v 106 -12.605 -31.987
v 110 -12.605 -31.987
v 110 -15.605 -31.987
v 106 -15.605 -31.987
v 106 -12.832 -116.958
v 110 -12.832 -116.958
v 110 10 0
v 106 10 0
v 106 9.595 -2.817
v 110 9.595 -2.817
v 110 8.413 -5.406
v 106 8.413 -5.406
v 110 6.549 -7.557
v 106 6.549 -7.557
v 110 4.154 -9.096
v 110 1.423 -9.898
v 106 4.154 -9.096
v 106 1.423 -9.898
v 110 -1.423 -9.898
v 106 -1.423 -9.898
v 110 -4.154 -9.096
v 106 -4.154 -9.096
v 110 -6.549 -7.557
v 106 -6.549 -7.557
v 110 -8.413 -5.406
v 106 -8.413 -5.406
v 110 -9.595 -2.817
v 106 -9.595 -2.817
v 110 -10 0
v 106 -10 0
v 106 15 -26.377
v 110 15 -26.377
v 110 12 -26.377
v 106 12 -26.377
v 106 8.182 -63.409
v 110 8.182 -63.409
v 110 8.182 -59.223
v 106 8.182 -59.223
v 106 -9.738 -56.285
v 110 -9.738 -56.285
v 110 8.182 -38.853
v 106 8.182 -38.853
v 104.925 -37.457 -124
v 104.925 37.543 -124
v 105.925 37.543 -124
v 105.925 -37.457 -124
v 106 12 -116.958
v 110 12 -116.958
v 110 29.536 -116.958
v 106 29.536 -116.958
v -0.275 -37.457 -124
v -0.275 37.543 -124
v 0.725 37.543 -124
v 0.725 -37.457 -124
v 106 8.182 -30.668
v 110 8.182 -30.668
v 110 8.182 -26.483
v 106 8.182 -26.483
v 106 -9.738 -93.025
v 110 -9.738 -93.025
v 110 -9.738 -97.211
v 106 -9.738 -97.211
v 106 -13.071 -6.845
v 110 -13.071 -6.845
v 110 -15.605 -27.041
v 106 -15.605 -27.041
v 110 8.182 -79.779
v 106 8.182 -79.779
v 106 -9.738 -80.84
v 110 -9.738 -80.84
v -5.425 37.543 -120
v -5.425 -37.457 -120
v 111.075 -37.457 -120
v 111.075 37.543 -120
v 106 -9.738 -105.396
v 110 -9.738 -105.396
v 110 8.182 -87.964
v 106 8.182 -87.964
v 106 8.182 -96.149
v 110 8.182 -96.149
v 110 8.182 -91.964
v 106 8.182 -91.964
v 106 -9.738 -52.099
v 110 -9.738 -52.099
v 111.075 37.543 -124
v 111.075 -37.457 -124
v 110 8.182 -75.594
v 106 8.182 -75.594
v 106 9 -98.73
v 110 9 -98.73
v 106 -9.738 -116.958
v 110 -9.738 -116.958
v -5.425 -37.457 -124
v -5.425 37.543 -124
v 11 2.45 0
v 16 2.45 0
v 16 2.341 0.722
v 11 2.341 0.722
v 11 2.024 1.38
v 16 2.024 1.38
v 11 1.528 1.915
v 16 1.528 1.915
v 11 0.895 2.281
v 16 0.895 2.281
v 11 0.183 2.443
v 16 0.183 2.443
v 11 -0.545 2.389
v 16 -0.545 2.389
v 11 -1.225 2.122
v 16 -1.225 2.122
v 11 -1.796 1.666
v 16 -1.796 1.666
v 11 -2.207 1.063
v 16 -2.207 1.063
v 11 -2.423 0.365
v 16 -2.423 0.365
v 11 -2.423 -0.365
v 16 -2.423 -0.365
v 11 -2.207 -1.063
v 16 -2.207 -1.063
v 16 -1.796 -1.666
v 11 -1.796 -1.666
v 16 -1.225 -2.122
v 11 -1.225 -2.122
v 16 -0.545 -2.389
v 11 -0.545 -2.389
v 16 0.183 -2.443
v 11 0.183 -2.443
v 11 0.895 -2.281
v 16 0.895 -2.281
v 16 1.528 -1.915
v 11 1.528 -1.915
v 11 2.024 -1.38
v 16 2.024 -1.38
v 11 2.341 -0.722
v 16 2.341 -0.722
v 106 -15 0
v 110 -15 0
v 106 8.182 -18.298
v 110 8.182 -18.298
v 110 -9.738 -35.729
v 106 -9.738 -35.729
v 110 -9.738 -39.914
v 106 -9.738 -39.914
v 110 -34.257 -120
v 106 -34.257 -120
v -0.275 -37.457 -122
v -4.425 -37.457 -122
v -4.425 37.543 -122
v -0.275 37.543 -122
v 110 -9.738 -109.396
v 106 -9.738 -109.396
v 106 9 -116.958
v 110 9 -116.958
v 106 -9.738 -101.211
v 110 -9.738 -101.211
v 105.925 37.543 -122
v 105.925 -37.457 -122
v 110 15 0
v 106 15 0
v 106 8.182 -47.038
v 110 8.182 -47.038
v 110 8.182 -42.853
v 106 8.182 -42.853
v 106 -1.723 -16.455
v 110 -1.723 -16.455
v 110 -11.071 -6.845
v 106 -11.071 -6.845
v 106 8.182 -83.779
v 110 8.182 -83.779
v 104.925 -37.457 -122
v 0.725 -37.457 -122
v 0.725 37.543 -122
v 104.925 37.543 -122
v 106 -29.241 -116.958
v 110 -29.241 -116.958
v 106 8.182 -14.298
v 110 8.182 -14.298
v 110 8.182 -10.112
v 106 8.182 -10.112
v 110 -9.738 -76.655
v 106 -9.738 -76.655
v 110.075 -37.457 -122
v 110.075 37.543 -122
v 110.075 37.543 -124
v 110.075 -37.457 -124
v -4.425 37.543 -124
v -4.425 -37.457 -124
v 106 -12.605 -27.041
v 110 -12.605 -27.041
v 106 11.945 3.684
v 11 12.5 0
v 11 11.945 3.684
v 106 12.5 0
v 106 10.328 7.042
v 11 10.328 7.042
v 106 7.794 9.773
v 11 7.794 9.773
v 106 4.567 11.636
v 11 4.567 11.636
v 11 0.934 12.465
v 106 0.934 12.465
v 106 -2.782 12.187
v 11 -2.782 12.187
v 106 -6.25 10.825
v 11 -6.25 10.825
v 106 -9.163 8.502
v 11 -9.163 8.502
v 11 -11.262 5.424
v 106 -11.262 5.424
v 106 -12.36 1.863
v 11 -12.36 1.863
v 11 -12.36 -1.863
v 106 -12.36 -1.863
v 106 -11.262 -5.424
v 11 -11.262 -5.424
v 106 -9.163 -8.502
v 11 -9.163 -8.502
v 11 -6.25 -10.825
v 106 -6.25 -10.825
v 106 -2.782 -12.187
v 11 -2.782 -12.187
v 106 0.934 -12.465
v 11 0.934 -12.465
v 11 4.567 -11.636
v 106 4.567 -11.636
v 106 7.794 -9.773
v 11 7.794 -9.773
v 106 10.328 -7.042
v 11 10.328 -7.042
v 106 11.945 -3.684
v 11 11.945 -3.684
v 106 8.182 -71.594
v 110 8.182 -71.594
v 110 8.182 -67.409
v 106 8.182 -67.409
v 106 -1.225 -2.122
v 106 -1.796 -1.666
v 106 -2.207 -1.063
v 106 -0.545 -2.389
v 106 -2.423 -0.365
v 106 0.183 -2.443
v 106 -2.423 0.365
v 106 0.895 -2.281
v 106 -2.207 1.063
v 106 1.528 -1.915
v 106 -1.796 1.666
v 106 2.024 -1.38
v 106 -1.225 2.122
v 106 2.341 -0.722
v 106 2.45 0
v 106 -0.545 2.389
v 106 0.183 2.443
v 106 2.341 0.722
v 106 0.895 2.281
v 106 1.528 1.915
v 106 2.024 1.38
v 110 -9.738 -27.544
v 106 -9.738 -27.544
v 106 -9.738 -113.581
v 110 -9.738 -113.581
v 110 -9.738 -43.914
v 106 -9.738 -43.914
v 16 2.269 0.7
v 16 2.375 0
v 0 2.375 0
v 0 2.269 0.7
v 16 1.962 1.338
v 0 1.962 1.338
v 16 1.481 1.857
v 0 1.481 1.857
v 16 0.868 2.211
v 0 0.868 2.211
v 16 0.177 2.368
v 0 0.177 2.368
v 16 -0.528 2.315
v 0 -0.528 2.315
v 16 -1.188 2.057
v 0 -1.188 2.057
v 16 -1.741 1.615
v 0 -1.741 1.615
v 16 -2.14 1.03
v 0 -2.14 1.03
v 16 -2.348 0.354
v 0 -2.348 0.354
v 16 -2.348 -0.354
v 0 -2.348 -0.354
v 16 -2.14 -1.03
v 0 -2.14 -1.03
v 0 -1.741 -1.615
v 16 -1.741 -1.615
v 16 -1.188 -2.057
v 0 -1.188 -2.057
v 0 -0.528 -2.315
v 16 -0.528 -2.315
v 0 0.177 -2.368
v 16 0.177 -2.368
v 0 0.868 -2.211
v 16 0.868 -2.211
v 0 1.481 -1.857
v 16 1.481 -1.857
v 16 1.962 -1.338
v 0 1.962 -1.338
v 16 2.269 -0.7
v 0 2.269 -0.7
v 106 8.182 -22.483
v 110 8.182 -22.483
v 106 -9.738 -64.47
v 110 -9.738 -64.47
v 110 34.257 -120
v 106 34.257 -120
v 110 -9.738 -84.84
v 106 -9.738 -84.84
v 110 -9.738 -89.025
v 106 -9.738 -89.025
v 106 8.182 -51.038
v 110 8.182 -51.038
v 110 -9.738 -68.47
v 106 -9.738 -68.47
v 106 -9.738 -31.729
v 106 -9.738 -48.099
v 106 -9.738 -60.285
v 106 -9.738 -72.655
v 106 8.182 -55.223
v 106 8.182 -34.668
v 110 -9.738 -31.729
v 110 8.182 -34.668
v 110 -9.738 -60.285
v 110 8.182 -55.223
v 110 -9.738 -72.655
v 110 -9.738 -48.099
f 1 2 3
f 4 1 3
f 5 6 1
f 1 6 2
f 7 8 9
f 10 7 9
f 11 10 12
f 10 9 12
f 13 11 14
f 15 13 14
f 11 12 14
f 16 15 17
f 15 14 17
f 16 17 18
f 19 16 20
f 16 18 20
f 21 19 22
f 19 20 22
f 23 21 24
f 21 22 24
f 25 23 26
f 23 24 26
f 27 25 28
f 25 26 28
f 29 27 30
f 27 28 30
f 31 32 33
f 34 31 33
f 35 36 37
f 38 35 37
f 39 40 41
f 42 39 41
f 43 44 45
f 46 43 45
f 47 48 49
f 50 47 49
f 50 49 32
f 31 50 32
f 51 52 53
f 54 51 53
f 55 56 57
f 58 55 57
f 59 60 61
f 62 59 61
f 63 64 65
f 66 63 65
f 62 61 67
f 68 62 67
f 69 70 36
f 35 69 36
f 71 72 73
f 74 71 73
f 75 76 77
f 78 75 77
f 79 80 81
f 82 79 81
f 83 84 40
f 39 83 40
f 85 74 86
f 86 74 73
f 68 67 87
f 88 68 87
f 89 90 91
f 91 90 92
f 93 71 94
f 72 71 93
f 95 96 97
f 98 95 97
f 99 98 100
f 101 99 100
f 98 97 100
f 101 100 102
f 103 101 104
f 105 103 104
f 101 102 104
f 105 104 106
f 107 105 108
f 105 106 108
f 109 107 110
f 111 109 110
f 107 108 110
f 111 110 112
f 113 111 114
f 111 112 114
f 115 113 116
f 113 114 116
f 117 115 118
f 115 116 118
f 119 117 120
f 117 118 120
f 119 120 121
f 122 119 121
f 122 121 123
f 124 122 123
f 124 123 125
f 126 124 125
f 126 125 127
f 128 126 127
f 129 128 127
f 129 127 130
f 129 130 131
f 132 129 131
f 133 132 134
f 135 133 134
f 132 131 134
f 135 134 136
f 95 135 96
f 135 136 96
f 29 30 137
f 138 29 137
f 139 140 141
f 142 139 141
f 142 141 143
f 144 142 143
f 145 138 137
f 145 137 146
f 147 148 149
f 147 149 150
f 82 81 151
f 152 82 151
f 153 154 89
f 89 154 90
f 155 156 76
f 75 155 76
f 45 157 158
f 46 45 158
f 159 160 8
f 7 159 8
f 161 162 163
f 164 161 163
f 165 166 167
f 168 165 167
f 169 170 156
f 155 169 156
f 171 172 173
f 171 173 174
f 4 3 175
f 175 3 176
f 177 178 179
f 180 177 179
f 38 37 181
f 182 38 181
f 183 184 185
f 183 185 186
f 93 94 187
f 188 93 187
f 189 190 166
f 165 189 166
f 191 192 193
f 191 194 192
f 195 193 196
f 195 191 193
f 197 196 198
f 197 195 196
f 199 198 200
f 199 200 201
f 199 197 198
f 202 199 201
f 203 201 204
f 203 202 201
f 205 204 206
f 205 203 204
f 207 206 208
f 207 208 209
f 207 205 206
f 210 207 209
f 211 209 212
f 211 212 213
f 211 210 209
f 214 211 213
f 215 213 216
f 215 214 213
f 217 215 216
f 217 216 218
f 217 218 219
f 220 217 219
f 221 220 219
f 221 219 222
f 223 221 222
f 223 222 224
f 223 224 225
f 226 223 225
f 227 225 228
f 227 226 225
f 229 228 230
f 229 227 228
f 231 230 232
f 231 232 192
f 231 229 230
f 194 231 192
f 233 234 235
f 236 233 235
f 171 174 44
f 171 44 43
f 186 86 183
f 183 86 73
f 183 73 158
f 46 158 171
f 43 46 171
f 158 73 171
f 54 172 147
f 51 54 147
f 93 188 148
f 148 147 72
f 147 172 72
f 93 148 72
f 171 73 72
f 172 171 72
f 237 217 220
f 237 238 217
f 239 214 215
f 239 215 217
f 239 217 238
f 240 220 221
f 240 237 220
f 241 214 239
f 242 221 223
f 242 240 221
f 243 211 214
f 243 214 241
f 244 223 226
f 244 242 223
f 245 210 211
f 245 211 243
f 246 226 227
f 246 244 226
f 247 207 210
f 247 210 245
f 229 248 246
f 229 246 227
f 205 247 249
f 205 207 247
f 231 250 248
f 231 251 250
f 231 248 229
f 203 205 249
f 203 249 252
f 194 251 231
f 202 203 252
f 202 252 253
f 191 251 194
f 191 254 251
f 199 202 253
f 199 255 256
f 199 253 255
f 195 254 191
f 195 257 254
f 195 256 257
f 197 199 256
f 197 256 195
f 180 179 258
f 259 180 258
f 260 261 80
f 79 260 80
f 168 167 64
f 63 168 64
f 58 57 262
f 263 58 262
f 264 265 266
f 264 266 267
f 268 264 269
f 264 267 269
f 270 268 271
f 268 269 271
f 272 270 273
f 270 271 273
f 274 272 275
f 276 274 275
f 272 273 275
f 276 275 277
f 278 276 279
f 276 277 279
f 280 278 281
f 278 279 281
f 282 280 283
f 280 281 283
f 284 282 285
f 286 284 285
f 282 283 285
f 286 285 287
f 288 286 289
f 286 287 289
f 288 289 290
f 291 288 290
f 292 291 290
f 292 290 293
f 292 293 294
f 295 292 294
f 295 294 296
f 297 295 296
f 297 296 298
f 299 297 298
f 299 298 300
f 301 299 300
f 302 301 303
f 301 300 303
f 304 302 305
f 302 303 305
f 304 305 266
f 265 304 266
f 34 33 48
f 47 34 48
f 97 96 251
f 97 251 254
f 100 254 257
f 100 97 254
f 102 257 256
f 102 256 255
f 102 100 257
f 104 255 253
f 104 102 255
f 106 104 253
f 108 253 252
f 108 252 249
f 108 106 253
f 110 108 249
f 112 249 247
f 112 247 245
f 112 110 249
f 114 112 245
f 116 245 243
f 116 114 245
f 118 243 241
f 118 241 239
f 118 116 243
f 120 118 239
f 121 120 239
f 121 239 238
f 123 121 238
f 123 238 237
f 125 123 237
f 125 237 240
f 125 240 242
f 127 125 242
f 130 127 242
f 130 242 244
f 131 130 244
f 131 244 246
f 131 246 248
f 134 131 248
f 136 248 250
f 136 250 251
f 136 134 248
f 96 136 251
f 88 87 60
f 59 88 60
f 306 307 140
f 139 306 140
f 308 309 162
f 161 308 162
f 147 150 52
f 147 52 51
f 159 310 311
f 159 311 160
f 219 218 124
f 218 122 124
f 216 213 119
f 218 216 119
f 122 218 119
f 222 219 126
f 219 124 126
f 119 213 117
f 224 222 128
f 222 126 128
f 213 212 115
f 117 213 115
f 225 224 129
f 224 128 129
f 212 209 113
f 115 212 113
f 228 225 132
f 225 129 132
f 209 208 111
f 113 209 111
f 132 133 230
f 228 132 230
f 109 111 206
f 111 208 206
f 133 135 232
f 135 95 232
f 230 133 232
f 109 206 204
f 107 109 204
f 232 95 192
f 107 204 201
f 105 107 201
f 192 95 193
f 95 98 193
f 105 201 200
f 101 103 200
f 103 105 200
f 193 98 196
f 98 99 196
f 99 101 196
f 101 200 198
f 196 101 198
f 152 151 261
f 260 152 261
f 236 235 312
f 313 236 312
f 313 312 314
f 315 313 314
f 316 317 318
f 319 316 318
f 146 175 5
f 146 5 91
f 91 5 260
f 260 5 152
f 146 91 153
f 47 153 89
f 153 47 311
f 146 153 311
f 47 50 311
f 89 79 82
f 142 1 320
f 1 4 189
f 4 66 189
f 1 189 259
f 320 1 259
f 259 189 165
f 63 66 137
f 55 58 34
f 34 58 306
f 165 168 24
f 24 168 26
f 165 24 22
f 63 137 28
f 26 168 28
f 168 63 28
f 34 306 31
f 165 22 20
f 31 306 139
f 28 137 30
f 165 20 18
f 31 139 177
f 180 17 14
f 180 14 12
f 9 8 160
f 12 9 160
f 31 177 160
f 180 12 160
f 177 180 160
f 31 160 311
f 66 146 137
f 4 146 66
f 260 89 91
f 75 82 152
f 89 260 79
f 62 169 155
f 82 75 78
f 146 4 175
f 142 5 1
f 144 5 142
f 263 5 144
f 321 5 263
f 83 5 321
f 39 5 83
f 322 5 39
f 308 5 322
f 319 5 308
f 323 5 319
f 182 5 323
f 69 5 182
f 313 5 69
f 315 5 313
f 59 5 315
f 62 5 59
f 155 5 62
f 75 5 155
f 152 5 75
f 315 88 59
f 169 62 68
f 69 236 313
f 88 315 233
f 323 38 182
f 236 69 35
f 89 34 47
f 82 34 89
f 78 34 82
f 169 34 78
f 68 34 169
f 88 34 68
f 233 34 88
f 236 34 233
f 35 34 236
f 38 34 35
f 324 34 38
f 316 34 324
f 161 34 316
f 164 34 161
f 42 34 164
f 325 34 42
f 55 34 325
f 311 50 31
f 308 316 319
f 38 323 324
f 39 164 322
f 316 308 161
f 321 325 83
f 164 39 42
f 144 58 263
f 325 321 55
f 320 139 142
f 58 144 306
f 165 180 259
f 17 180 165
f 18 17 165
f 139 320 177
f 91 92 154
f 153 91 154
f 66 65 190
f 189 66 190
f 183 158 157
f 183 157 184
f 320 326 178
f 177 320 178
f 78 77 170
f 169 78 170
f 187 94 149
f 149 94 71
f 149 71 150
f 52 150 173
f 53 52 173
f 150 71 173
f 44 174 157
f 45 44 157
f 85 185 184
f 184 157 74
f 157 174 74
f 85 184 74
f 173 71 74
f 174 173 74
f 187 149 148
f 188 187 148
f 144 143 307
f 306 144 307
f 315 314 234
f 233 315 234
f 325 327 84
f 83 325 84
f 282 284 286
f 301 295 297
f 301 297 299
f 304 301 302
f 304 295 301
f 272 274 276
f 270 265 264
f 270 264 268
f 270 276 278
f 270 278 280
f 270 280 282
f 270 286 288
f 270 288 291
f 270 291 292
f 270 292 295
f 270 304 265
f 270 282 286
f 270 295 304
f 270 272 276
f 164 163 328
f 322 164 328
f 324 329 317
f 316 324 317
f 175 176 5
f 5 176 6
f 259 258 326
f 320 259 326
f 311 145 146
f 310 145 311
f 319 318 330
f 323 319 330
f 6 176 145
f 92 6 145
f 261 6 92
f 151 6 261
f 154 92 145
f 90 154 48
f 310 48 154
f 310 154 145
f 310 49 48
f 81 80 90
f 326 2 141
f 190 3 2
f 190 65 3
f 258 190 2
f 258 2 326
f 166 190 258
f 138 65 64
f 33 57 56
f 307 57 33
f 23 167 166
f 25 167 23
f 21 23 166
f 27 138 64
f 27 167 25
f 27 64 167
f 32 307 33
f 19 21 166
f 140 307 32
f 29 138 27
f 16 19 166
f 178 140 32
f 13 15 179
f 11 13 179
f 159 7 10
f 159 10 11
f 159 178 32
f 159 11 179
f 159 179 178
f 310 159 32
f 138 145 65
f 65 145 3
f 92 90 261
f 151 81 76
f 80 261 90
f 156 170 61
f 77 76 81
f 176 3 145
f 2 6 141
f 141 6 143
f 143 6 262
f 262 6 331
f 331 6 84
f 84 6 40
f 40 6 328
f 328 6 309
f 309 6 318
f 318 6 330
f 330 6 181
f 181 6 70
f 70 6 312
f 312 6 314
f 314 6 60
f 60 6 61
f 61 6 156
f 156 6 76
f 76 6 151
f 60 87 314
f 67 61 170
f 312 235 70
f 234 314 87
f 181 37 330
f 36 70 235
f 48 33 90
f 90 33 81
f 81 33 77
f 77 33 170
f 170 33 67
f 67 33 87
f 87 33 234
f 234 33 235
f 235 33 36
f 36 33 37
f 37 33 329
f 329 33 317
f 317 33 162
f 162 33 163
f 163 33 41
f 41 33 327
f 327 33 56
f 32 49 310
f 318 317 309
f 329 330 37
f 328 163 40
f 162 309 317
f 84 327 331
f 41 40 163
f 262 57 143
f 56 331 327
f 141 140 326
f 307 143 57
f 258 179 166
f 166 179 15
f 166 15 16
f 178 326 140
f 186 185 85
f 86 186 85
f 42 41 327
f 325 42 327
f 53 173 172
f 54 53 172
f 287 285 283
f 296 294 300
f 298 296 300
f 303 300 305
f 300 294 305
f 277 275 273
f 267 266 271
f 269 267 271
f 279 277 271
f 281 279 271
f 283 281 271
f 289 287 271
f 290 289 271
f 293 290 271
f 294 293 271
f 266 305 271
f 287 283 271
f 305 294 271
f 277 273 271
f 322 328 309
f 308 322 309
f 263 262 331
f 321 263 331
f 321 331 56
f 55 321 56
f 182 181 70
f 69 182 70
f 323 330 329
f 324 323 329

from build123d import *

# Parameters (mm, degrees)
F0_R          = 2.375
F1_DEPTH      = 16
F2_R          = 12.5
F2_R_2        = 2.45
F3_DEPTH      = 90
F3_DEPTH_BACK = 5
F5_DEPTH      = 4
F7_DEPTH      = 4
F9_DEPTH      = 25
F10_W         = 104.2
F10_H         = 75
F10_W_2       = 4.15
F10_W_3       = 1
F10_W_4       = 4
F10_H_2       = 68.5138990056
F11_DEPTH     = 2
F12_DEPTH     = 4


with BuildPart() as f1:
    # F0 (on Right) → F1 (new body)
    with BuildSketch(Plane.YZ):
        Circle(F0_R)
    extrude(amount=F1_DEPTH)


with BuildPart() as f3:
    # F2 (on face) → F3 (new body, two sides)
    with BuildSketch(Plane.YZ.offset(16)) as f3_sk:
        Circle(F2_R)
        Circle(F2_R_2, mode=Mode.SUBTRACT)
    extrude(amount=F3_DEPTH)
    extrude(f3_sk.sketch, amount=-F3_DEPTH_BACK)


with BuildPart() as f5:
    # F4 (on face) → F5 (new body)
    with BuildSketch(Plane.YZ.offset(106)):
        with BuildLine():
            Line((15, 0), (12.5, 0))
            ThreePointArc((12.5, 0), (0, -12.5), (-12.5, 0))
            Line((-12.5, 0), (-15, 0))
            ThreePointArc((-15, 0), (0, -15), (15, 0))
        make_face()
        with BuildLine():
            Line((12.5, 0), (10, 0))
            ThreePointArc((10, 0), (0, -10), (-10, 0))
            Line((-10, 0), (-12.5, 0))
            ThreePointArc((-12.5, 0), (0, -12.5), (12.5, 0))
        make_face()
    extrude(amount=F5_DEPTH)

    # F6 (on face) → F7 (join)
    with BuildSketch(Plane.YZ.offset(110)):
        with BuildLine():
            Line((34.2569495028, -120), (15, 0))
            ThreePointArc((15, 0), (0, -15), (-15, 0))
            Line((-15, 0), (-34.2569495028, -120))
            Line((-34.2569495028, -120), (34.2569495028, -120))
        make_face()
        with BuildLine():
            Line((15, 0), (12.5, 0))
            ThreePointArc((12.5, 0), (0, -12.5), (-12.5, 0))
            Line((-12.5, 0), (-15, 0))
            ThreePointArc((-15, 0), (0, -15), (15, 0))
        make_face()
        with BuildLine():
            Line((12.5, 0), (10, 0))
            ThreePointArc((10, 0), (0, -10), (-10, 0))
            Line((-10, 0), (-12.5, 0))
            ThreePointArc((-12.5, 0), (0, -12.5), (12.5, 0))
        make_face()
    extrude(amount=-F7_DEPTH)

    # F8 (on face) → F9 (cut)
    with BuildSketch(Plane.YZ.offset(110)):
        Polygon((8.1820506343, -10.1123183083), (-9.7382985293, -27.5439299909), (-9.7382985293, -31.7291163014), (8.1820506343, -14.2975046188), align=None)
        Polygon((8.1820506343, -18.2975046188), (-9.7382985293, -35.7291163014), (-9.7382985293, -39.9143026119), (8.1820506343, -22.4826909294), align=None)
        Polygon((8.1820506343, -26.4826909294), (-9.7382985293, -43.9143026119), (-9.7382985293, -48.0994889225), (8.1820506343, -30.6678772399), align=None)
        Polygon((8.1820506343, -34.6678772399), (-9.7382985293, -52.0994889225), (-9.7382985293, -56.284675233), (8.1820506343, -38.8530635505), align=None)
        Polygon((8.1820506343, -42.8530635505), (-9.7382985293, -60.284675233), (-9.7382985293, -64.4698615436), (8.1820506343, -47.038249861), align=None)
        Polygon((8.1820506343, -51.038249861), (-9.7382985293, -68.4698615436), (-9.7382985293, -72.6550478541), (8.1820506343, -55.2234361716), align=None)
        Polygon((8.1820506343, -59.2234361716), (-9.7382985293, -76.6550478541), (-9.7382985293, -80.8402341647), (8.1820506343, -63.4086224821), align=None)
        Polygon((8.1820506343, -67.4086224821), (-9.7382985293, -84.8402341647), (-9.7382985293, -89.0254204752), (8.1820506343, -71.5938087926), align=None)
        Polygon((8.1820506343, -75.5938087926), (-9.7382985293, -93.0254204752), (-9.7382985293, -97.2106067857), (8.1820506343, -79.7789951032), align=None)
        Polygon((8.1820506343, -83.7789951032), (-9.7382985293, -101.2106067857), (-9.7382985293, -105.3957930963), (8.1820506343, -87.9641814137), align=None)
        Polygon((8.1820506343, -91.9641814137), (-9.7382985293, -109.3957930963), (-9.7382985293, -113.5809794068), (8.1820506343, -96.1493677243), align=None)
        Polygon((-13.0714615807, -6.8447575172), (-15.6052940354, -27.0409584045), (-12.6052940354, -27.0409584045), (-1.7229356509, -16.4553920288), (-11.0714615807, -6.8447575172), align=None)
        Polygon((-29.240867123, -116.9576048851), (-12.8319226205, -116.9576048851), (-12.6052940354, -31.9873051873), (-15.6052940354, -31.9873051873), align=None)
        Polygon((12, -26.3765715063), (12, -98.7303515781), (12, -116.9576048851), (29.5359532141, -116.9576048851), (15, -26.3765715063), align=None)
        Polygon((9, -98.7303515781), (-9.7382985293, -116.9576048851), (9, -116.9576048851), align=None)
    extrude(amount=-F9_DEPTH, mode=Mode.SUBTRACT)


with BuildPart() as f11:
    # F10 (on face) → F11 (new body)
    with BuildSketch(Plane(origin=(0, 0, -120), x_dir=(1, 0, 0), z_dir=(0, 0, -1))):
        with Locations((52.825, -0.0430504972)):
            Rectangle(F10_W, F10_H)
        with Locations((-2.35, -0.0430504972)):
            Rectangle(F10_W_2, F10_H)
        with Locations((-4.925, -0.0430504972)):
            Rectangle(F10_W_3, F10_H)
        with Locations((0.225, -0.0430504972)):
            Rectangle(F10_W_3, F10_H)
        with Locations((110.575, -0.0430504972)):
            Rectangle(F10_W_3, F10_H)
        with Locations((105.425, -0.0430504972)):
            Rectangle(F10_W_3, F10_H)
        with Locations((108, -0.0430504972)):
            Rectangle(F10_W_2, F10_H)
        with Locations((108, 0)):
            Rectangle(F10_W_4, F10_H_2, mode=Mode.SUBTRACT)
        with Locations((108, 0)):
            Rectangle(F10_W_4, F10_H_2)
    extrude(amount=F11_DEPTH)

    # F10 (on face) → F12 (join)
    with BuildSketch(Plane(origin=(0, 0, -120), x_dir=(1, 0, 0), z_dir=(0, 0, -1))):
        with Locations((110.575, -0.0430504972)):
            Rectangle(F10_W_3, F10_H)
        with Locations((105.425, -0.0430504972)):
            Rectangle(F10_W_3, F10_H)
        with Locations((-4.925, -0.0430504972)):
            Rectangle(F10_W_3, F10_H)
        with Locations((0.225, -0.0430504972)):
            Rectangle(F10_W_3, F10_H)
    extrude(amount=F12_DEPTH)


solid = Compound([f1.part, f3.part, f5.part, f11.part])
